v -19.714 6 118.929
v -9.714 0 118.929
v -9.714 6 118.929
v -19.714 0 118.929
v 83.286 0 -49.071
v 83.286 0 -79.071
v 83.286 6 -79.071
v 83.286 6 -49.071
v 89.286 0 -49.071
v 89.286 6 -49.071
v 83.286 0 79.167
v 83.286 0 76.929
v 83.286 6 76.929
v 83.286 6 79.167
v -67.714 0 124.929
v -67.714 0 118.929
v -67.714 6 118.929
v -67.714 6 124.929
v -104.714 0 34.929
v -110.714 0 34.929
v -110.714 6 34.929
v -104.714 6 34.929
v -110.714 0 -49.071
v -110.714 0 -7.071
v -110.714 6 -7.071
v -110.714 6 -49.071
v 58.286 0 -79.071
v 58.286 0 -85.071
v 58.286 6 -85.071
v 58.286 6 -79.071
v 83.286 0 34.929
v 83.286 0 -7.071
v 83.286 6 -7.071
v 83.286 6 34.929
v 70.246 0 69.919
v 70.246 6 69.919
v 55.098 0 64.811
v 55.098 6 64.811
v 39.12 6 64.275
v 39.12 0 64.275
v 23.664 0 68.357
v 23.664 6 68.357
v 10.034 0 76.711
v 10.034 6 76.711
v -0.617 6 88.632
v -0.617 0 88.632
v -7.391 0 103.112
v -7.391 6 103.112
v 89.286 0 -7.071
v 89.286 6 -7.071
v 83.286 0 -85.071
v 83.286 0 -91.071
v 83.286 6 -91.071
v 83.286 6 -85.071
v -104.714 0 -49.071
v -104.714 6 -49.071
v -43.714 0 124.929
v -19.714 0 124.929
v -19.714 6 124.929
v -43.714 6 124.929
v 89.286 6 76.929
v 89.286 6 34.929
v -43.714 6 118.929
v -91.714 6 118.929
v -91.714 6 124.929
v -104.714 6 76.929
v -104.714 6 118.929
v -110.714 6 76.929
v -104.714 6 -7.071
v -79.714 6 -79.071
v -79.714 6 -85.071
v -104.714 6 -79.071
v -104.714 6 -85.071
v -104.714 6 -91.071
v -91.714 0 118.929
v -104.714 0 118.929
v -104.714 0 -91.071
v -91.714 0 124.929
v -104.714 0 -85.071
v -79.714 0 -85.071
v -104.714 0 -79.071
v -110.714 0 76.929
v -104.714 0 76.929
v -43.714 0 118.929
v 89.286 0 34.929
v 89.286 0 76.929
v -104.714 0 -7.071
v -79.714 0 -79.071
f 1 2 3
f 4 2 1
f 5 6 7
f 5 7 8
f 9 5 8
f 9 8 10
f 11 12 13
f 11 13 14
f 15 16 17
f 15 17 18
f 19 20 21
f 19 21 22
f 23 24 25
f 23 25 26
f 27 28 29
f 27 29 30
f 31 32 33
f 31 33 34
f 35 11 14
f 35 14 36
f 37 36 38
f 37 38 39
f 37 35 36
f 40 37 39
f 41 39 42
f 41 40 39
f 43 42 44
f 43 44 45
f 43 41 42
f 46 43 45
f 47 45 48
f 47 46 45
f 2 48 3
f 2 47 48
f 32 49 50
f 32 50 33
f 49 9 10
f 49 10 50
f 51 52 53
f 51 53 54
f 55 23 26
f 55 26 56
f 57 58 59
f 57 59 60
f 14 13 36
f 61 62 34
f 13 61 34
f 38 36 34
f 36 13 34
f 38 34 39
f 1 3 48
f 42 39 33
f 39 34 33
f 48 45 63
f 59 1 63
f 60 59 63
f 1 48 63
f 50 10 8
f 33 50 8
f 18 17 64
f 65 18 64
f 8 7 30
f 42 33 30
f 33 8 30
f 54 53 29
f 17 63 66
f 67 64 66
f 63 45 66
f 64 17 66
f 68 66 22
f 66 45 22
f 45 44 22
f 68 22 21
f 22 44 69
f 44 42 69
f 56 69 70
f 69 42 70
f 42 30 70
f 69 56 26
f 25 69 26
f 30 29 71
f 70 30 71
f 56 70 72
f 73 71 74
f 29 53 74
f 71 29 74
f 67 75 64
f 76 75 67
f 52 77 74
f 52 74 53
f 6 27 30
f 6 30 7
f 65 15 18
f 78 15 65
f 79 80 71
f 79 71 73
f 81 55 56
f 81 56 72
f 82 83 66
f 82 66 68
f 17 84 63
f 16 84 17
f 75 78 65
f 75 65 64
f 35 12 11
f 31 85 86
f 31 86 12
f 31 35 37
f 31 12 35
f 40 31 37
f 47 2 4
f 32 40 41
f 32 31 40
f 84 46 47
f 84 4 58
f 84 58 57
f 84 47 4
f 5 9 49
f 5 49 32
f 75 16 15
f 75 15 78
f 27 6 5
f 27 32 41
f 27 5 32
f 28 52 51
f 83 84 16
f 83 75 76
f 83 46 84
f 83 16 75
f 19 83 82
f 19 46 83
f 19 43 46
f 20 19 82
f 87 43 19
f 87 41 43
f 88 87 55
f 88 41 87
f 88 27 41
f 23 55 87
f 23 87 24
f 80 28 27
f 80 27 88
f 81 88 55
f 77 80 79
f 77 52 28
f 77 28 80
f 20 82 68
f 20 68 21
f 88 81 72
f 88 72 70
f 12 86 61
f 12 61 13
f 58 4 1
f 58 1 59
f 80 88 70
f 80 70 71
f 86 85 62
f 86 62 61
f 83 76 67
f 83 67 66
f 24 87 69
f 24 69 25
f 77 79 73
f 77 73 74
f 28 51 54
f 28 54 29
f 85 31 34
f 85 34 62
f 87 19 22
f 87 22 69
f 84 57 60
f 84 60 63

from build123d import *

# Parameters (mm, degrees)
BOSS_EXTRUDE1_DEPTH = 6


with BuildPart() as part:
    # Sketch1 → Boss-Extrude1 (new body)
    with BuildSketch(Plane(origin=(0, 0, 0), x_dir=(1, 0, 0), z_dir=(0, 1, 0))):
        with BuildLine():
            Line((-43.714285714, -124.928571429), (-43.714285714, -118.928571429))
            Line((-43.714285714, -118.928571429), (-67.714285714, -118.928571429))
            Line((-67.714285714, -118.928571429), (-67.714285714, -124.928571429))
            Line((-67.714285714, -124.928571429), (-91.714285714, -124.928571429))
            Line((-91.714285714, -124.928571429), (-91.714285714, -118.928571429))
            Line((-91.714285714, -118.928571429), (-104.714285714, -118.928571429))
            Line((-104.714285714, -118.928571429), (-104.714285714, -76.928571429))
            Line((-104.714285714, -76.928571429), (-110.714285714, -76.928571429))
            Line((-110.714285714, -76.928571429), (-110.714285714, -34.928571429))
            Line((-110.714285714, -34.928571429), (-104.714285714, -34.928571429))
            Line((-104.714285714, -34.928571429), (-104.714285714, 7.071428571))
            Line((-104.714285714, 7.071428571), (-110.714285714, 7.071428571))
            Line((-110.714285714, 7.071428571), (-110.714285714, 49.071428571))
            Line((-110.714285714, 49.071428571), (-104.714285714, 49.071428571))
            Line((-104.714285714, 49.071428571), (-104.714285714, 79.071428571))
            Line((-104.714285714, 79.071428571), (-79.714285714, 79.071428571))
            Line((-79.714285714, 79.071428571), (-79.714285714, 85.071428571))
            Line((-79.714285714, 85.071428571), (-104.714285714, 85.071428571))
            Line((-104.714285714, 85.071428571), (-104.714285714, 91.071428571))
            Line((-104.714285714, 91.071428571), (83.285714286, 91.071428571))
            Line((83.285714286, 91.071428571), (83.285714286, 85.071428571))
            Line((83.285714286, 85.071428571), (58.285714286, 85.071428571))
            Line((58.285714286, 85.071428571), (58.285714286, 79.071428571))
            Line((58.285714286, 79.071428571), (83.285714286, 79.071428571))
            Line((83.285714286, 79.071428571), (83.285714286, 49.071428571))
            Line((83.285714286, 49.071428571), (89.285714286, 49.071428571))
            Line((89.285714286, 49.071428571), (89.285714286, 7.071428571))
            Line((89.285714286, 7.071428571), (83.285714286, 7.071428571))
            Line((83.285714286, 7.071428571), (83.285714286, -34.928571429))
            Line((83.285714286, -34.928571429), (89.285714286, -34.928571429))
            Line((89.285714286, -34.928571429), (89.285714286, -76.928571429))
            Line((89.285714286, -76.928571429), (83.285714286, -76.928571429))
            Line((83.285714286, -76.928571429), (83.285714286, -79.166780724))
            ThreePointArc((83.285714286, -79.166780724), (23.663965975, -68.356840195), (-9.714285714, -118.928571429))
            Line((-9.714285714, -118.928571429), (-19.714285714, -118.928571429))
            Line((-19.714285714, -118.928571429), (-19.714285714, -124.928571429))
            Line((-19.714285714, -124.928571429), (-43.714285714, -124.928571429))
        make_face()
    extrude(amount=BOSS_EXTRUDE1_DEPTH)


solid = part.part
